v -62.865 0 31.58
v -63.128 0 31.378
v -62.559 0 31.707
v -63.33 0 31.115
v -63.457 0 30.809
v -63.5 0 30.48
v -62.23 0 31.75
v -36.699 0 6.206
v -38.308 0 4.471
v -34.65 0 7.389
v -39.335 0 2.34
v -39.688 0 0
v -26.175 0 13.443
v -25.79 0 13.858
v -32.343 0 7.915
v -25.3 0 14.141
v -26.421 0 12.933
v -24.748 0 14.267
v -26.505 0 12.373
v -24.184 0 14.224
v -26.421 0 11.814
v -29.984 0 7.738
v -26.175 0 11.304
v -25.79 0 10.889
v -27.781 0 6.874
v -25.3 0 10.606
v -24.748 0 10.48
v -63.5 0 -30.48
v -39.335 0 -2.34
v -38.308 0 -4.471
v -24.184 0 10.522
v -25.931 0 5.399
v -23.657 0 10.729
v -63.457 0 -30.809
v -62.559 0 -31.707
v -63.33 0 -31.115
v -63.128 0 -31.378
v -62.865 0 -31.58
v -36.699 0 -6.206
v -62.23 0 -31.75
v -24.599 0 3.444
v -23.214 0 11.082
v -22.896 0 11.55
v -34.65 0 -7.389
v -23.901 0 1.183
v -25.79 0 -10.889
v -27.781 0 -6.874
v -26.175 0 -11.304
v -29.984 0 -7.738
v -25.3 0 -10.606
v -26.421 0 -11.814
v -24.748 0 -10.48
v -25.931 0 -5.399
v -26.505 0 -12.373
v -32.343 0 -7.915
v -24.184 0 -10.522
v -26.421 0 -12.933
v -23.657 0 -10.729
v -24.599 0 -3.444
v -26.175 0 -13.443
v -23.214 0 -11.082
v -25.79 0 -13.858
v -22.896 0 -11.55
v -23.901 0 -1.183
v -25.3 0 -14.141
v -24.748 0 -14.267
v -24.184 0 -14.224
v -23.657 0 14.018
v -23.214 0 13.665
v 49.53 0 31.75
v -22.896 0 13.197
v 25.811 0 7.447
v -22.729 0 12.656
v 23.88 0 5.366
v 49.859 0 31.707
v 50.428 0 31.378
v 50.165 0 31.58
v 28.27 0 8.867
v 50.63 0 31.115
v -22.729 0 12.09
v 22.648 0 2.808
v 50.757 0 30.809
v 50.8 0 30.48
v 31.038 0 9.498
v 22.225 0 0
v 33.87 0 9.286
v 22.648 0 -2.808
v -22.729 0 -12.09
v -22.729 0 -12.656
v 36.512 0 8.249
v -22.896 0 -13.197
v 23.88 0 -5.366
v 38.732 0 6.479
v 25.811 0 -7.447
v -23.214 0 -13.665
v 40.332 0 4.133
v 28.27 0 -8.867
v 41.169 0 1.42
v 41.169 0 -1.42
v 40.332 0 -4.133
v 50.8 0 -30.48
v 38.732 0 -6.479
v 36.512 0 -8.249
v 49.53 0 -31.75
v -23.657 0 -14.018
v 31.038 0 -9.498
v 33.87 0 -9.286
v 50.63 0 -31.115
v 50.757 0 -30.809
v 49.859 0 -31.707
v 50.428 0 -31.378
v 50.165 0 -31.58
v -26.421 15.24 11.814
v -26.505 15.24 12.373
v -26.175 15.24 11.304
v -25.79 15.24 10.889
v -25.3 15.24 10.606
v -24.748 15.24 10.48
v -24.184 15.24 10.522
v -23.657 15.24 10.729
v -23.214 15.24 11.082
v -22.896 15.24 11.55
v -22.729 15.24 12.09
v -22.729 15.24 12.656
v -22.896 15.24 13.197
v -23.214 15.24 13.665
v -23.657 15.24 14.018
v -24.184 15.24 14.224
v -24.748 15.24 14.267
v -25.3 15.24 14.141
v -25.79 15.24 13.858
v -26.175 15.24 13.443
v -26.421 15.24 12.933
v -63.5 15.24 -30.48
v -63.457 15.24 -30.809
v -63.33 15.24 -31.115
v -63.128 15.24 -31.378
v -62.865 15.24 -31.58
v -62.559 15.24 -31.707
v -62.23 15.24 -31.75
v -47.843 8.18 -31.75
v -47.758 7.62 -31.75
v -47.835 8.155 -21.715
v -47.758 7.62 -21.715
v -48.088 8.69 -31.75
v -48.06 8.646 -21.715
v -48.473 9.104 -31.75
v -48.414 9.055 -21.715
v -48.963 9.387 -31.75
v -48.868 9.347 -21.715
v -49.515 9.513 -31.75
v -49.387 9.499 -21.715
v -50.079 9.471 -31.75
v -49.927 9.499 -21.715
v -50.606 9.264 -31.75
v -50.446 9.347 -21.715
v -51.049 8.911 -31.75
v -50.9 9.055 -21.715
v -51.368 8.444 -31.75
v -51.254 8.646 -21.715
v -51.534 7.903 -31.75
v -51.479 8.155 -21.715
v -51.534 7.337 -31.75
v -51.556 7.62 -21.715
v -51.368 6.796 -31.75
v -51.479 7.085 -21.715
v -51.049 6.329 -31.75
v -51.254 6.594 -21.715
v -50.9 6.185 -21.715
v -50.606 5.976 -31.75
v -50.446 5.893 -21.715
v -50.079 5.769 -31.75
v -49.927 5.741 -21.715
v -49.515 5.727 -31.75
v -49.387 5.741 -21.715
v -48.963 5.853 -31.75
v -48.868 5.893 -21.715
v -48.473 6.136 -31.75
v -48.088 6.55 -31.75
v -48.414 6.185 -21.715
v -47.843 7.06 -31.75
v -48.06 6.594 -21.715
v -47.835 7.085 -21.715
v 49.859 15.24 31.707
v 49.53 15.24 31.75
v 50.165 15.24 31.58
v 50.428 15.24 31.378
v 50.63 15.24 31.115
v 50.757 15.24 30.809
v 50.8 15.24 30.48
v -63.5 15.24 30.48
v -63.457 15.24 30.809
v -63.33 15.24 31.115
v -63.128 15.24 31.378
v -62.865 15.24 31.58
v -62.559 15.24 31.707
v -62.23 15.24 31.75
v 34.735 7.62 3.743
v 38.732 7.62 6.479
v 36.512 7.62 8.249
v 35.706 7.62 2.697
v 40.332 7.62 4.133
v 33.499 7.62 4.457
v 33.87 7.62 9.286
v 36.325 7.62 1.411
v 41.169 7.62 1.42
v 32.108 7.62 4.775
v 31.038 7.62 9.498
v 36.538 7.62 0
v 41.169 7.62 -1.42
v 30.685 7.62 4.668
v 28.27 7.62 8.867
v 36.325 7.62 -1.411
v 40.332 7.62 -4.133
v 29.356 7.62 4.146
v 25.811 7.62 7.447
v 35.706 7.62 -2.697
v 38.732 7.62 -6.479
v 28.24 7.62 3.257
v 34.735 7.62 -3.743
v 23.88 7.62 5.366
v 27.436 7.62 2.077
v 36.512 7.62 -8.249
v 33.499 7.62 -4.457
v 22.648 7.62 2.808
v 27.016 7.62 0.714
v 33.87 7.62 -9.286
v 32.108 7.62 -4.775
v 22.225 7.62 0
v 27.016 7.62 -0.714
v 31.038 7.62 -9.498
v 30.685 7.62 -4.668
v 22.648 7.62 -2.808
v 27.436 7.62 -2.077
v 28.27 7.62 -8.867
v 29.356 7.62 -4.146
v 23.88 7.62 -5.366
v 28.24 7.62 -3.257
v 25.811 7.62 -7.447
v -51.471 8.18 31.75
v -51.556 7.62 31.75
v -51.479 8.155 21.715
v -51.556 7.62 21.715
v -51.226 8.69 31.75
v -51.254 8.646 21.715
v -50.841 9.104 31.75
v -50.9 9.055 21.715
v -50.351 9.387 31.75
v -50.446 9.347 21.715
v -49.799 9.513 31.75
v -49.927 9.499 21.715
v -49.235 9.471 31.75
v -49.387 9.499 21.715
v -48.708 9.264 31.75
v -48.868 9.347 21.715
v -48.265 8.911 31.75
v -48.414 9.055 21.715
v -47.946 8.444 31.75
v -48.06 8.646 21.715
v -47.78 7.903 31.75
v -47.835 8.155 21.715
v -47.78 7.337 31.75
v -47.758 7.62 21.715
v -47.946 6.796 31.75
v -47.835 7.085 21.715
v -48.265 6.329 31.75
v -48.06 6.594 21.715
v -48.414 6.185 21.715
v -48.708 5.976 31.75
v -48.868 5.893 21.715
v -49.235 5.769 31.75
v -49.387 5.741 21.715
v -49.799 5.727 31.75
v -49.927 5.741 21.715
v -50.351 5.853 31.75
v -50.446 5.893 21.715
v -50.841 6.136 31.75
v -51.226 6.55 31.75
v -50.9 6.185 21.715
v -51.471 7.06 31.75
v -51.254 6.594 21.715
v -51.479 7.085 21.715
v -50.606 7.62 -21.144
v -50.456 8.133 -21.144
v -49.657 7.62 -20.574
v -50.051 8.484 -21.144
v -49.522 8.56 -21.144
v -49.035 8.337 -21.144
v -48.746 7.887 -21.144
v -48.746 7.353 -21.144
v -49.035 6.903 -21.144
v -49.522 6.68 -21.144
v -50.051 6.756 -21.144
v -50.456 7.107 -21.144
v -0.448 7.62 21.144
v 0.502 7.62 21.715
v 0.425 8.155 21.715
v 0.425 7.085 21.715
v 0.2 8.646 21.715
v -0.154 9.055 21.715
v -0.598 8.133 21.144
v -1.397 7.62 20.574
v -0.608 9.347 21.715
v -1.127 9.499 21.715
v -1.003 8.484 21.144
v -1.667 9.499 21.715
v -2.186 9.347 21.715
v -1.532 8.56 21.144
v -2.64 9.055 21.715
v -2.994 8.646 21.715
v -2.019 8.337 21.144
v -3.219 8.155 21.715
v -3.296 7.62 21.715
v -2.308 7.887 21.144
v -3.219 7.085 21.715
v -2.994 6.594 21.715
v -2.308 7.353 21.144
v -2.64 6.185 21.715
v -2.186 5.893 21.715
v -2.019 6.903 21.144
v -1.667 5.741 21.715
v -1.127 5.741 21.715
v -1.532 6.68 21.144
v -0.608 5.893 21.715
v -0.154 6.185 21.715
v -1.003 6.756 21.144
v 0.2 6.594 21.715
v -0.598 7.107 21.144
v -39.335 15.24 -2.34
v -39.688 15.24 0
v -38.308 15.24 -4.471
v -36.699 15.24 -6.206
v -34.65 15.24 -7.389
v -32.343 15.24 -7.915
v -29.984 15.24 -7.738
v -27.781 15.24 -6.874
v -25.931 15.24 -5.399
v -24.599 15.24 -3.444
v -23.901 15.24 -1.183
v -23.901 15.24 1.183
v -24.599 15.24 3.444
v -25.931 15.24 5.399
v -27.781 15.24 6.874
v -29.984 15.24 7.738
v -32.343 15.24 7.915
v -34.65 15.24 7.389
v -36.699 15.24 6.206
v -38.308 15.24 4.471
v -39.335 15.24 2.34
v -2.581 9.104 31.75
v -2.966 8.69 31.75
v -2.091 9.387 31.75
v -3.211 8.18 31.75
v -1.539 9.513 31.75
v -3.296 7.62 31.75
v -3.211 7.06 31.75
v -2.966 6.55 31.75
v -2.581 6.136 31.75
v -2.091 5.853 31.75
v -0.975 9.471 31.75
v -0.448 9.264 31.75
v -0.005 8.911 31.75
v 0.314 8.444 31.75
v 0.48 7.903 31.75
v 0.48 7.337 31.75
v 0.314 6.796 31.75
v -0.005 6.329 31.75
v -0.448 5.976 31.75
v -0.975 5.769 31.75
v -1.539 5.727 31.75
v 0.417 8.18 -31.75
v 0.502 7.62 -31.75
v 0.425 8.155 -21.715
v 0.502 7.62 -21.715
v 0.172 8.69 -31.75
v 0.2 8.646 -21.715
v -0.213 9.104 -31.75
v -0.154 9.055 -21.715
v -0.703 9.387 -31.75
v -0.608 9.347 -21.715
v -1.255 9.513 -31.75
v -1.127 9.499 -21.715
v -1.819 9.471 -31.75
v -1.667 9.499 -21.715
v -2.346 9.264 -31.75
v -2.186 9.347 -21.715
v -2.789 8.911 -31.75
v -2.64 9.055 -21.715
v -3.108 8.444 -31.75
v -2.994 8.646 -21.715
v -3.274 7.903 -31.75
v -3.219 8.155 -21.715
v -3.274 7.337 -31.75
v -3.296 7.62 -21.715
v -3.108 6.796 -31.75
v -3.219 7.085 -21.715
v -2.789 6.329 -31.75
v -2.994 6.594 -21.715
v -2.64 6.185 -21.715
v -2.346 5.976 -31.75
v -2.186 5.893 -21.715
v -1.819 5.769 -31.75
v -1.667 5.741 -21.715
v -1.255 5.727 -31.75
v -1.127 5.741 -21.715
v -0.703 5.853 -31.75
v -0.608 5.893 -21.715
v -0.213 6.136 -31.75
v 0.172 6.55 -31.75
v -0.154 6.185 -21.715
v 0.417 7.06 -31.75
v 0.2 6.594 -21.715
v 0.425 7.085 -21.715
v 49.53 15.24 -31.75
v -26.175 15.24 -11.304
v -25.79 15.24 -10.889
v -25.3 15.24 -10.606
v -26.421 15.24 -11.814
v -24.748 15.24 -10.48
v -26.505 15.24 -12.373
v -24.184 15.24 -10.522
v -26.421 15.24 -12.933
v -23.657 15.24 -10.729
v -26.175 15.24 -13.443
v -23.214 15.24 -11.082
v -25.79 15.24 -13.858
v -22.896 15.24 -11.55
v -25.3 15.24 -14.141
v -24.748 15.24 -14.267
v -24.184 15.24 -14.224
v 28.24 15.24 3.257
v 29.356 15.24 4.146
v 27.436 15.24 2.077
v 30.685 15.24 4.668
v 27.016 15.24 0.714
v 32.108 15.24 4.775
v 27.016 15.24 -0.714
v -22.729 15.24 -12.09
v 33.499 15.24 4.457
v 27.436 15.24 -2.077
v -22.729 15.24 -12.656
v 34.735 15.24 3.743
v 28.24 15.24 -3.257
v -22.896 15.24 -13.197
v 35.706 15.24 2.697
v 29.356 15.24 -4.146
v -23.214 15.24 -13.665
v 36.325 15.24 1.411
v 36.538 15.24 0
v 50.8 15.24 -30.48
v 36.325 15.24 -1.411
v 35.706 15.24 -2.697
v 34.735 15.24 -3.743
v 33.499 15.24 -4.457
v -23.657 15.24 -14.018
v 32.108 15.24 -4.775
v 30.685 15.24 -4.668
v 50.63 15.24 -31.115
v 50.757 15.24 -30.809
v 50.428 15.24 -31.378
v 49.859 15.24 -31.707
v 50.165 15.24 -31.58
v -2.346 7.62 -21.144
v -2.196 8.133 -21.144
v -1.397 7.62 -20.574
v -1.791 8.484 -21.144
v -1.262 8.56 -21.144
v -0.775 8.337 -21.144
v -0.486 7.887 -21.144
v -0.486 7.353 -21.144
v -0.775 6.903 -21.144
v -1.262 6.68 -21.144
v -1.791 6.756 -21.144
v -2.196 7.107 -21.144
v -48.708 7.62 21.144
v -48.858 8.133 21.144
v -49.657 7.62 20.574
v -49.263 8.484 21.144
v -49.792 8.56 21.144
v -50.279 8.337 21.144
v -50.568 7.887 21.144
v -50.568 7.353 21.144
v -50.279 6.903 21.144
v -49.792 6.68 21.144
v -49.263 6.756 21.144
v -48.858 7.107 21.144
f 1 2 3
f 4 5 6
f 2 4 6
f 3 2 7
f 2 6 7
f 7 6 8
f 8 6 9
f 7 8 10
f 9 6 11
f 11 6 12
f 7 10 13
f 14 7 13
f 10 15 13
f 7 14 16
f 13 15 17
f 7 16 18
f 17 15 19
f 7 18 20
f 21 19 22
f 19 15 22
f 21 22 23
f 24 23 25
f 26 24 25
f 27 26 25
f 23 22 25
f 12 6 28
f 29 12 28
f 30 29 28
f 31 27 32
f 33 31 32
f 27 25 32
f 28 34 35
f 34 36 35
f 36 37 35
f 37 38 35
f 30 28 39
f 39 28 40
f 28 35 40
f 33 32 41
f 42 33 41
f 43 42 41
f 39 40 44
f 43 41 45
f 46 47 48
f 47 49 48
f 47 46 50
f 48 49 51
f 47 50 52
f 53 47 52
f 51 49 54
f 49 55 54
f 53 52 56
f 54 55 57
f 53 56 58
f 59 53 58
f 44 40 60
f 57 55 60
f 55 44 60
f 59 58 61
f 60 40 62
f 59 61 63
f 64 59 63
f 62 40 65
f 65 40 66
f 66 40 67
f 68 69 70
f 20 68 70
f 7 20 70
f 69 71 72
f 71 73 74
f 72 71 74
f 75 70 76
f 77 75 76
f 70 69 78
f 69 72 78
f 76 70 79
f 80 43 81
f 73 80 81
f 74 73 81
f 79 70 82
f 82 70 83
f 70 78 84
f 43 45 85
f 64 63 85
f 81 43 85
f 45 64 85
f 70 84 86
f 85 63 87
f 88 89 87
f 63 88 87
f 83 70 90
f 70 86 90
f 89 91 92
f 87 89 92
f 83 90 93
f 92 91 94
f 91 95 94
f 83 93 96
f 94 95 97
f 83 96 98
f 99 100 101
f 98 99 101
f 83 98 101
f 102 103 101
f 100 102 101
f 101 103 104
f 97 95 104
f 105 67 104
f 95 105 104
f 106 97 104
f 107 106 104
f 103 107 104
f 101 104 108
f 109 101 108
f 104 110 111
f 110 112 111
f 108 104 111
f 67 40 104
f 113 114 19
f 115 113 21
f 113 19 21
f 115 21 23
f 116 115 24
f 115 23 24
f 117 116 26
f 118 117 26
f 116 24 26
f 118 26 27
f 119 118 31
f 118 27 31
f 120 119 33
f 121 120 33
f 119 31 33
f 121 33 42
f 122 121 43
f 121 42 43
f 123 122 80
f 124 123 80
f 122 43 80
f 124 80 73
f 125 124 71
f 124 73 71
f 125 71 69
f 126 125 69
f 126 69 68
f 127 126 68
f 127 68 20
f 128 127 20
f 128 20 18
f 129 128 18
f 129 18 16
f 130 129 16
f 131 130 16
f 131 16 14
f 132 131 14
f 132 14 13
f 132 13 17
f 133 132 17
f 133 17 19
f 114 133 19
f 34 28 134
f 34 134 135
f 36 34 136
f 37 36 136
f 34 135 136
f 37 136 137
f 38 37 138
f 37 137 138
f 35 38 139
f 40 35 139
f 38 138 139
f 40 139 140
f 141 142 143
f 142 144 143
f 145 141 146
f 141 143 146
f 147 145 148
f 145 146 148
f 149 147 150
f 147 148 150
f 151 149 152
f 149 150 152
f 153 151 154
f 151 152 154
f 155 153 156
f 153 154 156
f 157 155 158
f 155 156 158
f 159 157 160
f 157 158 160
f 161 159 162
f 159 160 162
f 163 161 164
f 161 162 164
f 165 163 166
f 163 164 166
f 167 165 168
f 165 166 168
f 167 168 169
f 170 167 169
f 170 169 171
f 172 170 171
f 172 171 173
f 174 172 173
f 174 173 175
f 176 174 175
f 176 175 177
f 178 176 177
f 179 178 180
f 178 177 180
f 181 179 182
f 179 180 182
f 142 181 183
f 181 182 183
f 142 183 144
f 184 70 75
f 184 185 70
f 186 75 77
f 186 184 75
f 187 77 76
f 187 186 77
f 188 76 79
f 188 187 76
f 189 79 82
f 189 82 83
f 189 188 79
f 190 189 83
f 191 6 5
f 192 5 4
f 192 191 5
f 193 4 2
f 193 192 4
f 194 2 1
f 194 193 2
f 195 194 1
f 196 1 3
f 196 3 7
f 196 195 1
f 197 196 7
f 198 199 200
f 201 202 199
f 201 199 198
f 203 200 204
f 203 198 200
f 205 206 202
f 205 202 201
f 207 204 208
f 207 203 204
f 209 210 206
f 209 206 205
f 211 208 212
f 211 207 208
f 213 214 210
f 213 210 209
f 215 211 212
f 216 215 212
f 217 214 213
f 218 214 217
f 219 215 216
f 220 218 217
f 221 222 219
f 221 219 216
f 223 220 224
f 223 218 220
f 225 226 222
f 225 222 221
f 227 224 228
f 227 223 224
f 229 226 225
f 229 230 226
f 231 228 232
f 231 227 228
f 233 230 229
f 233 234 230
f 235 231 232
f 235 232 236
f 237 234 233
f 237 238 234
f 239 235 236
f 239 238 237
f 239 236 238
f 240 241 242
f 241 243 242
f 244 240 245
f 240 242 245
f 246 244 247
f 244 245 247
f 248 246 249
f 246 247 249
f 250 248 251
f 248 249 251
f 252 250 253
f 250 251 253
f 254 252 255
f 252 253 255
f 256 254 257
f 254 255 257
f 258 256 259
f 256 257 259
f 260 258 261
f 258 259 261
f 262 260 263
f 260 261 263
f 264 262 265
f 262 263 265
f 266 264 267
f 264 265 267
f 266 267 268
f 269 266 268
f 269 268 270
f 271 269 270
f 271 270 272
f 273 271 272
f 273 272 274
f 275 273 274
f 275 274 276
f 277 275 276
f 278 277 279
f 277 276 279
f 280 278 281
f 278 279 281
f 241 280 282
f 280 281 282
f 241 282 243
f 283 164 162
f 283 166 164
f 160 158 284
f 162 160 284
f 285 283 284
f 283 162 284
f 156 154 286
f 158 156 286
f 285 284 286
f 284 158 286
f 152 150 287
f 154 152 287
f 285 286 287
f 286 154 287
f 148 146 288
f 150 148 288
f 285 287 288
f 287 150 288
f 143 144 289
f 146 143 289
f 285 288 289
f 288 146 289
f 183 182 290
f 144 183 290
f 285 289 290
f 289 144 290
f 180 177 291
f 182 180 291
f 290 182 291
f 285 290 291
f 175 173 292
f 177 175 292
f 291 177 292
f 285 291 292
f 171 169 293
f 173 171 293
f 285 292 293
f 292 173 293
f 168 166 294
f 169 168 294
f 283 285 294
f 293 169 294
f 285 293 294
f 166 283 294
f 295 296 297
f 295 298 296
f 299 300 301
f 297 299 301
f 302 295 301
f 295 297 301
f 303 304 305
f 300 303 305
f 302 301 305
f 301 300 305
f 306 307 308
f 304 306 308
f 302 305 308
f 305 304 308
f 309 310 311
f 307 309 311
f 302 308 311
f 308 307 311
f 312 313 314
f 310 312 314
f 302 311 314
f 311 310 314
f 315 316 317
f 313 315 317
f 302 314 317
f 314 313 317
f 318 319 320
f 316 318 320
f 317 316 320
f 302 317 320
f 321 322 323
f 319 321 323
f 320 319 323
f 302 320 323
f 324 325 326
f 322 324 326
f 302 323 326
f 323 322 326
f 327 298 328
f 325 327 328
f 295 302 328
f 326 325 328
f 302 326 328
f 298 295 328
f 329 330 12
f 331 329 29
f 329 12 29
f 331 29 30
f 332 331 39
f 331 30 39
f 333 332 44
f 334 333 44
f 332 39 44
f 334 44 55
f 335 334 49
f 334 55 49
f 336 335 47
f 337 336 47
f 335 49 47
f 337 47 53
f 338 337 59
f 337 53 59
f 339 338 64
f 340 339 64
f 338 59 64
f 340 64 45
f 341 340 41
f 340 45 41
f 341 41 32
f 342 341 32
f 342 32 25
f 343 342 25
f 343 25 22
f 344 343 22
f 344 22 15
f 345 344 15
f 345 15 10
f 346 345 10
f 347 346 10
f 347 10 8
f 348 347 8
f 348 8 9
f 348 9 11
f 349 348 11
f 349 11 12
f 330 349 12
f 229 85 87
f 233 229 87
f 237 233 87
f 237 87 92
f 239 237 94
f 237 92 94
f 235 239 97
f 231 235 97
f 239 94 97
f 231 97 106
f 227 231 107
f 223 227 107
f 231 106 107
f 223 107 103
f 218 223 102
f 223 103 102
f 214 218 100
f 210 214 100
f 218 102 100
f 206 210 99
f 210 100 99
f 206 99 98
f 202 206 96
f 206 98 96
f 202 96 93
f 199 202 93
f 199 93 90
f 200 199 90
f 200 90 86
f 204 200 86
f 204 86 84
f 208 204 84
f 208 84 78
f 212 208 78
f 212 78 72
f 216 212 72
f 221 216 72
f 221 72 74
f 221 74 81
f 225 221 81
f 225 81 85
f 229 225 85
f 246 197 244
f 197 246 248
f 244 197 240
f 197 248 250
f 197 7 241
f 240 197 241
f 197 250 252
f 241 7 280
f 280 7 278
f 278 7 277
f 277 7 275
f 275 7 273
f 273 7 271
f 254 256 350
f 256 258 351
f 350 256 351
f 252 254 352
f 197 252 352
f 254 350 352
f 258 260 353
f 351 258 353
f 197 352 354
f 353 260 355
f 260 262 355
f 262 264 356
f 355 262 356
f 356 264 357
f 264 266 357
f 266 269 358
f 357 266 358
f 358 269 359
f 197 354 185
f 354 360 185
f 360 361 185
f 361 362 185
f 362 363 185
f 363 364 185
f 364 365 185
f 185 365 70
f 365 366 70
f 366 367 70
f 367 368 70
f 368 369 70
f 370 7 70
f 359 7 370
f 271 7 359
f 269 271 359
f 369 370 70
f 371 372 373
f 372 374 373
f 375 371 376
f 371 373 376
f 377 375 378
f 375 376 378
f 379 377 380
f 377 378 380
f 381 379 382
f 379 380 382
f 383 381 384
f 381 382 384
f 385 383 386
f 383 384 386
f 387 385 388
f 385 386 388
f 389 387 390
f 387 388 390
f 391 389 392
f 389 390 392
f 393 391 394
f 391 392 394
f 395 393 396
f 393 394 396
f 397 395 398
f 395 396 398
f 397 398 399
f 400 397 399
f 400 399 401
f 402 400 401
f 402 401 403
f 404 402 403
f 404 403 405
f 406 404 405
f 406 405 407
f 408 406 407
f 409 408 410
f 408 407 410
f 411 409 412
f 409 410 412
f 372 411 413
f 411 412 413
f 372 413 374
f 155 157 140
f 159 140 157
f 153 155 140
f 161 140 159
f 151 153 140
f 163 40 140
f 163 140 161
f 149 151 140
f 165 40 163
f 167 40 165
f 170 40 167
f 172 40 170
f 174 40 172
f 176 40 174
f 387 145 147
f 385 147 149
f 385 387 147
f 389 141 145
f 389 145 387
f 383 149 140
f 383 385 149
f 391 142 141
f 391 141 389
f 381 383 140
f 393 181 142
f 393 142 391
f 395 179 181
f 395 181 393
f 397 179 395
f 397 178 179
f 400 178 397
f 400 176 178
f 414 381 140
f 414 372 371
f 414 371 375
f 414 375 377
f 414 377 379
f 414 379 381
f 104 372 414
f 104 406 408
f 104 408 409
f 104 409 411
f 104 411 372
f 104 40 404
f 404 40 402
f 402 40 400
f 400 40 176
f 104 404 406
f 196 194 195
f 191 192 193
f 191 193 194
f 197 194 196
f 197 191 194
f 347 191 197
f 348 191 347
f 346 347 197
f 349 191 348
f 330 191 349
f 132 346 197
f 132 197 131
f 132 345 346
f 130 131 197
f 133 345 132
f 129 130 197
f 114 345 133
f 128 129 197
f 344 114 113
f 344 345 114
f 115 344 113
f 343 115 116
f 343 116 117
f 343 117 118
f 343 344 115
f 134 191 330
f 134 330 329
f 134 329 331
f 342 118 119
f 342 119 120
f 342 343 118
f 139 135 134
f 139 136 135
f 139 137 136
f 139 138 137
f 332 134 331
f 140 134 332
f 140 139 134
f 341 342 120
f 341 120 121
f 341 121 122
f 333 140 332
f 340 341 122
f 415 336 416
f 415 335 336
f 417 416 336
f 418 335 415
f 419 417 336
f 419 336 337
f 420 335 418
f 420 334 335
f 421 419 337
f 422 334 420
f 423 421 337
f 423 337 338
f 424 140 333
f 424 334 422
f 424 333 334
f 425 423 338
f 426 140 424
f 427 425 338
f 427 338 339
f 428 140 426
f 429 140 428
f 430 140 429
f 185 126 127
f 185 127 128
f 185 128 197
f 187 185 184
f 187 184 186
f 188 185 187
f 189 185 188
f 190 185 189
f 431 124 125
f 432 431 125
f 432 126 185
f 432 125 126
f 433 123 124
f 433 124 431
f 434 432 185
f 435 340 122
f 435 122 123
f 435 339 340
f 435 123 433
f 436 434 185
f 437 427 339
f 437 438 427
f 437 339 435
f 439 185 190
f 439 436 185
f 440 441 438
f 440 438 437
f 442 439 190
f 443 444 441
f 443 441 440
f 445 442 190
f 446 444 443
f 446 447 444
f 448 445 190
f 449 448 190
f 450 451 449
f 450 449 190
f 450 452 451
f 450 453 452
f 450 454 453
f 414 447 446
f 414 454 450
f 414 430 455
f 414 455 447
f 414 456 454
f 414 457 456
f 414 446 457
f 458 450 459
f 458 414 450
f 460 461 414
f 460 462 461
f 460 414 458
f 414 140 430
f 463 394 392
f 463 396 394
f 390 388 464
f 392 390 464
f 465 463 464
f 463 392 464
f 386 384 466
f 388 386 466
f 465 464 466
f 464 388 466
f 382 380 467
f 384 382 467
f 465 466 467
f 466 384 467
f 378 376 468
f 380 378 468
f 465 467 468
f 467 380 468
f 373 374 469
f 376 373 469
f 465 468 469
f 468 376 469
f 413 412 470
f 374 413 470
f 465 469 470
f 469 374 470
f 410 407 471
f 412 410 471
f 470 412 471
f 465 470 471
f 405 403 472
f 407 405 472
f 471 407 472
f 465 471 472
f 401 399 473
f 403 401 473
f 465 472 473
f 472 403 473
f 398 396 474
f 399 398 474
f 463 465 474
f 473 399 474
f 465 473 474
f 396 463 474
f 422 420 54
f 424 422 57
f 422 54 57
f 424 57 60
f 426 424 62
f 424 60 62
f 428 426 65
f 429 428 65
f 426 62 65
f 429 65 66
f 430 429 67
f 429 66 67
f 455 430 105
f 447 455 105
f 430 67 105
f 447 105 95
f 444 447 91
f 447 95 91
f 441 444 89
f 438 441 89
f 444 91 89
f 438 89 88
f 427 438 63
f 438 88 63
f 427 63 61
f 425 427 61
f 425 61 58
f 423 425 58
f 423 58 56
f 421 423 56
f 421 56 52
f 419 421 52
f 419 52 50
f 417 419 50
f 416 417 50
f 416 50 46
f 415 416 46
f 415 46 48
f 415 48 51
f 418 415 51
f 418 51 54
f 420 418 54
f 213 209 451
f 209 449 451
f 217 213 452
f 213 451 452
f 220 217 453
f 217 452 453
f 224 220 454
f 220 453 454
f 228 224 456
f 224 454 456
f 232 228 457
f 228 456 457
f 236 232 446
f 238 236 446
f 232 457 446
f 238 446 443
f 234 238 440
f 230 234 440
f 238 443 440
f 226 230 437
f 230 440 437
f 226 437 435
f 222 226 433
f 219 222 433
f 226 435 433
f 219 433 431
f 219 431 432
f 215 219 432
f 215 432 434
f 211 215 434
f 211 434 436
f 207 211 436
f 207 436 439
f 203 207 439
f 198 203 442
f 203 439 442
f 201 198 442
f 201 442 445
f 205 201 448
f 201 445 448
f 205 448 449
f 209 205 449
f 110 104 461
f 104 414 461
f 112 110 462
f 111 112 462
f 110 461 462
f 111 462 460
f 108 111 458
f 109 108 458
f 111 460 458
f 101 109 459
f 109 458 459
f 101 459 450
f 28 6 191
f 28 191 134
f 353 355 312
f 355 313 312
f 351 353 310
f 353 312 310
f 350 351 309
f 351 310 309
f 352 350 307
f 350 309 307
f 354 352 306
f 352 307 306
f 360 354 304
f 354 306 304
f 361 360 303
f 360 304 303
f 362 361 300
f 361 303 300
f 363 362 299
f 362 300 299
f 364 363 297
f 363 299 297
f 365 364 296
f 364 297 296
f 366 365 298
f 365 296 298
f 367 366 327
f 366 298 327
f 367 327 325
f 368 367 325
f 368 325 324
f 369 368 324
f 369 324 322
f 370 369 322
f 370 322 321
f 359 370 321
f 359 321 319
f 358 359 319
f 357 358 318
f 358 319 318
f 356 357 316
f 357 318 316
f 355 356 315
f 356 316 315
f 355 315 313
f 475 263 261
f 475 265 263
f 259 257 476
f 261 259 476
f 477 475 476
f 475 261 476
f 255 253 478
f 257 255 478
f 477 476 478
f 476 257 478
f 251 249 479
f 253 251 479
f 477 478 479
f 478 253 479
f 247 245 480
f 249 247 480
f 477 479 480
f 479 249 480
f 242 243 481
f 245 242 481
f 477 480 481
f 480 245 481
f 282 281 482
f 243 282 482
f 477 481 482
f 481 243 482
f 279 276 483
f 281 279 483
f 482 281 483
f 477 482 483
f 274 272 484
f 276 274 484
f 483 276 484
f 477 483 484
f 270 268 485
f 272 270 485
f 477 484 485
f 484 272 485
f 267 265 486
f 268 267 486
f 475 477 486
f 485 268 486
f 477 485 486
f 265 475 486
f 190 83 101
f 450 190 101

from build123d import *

# Parameters (mm, degrees)
SKETCH1_W                                            = 114.3
SKETCH1_H                                            = 63.5
BOSS_EXTRUDE1_DEPTH                                  = 15.24
F_5_8_0_625_DIAMETER_HOLE1_D                         = 15.875
F_10_24_TAPPED_HOLE3_D                               = 3.7973
CBORE_FOR_3_8_BINDING_HEAD_MACHINE_SCREW_D           = 9.5758
CBORE_FOR_3_8_BINDING_HEAD_MACHINE_SCREW_CBORE_D     = 19.05
CBORE_FOR_3_8_BINDING_HEAD_MACHINE_SCREW_CBORE_DEPTH = 7.62
F_10_24_TAPPED_HOLE1_D                               = 3.7973
F_10_24_TAPPED_HOLE1_DEPTH                           = 10.035175986
F_10_24_TAPPED_HOLE1_TIP                             = 1.140824014
F_10_24_TAPPED_HOLE2_D                               = 3.7973
F_10_24_TAPPED_HOLE2_DEPTH                           = 10.035175986
F_10_24_TAPPED_HOLE2_TIP                             = 1.140824014
FILLET1_R                                            = 1.27


with BuildPart() as part:
    # Sketch1 → Boss-Extrude1 (new body)
    with BuildSketch(Plane(origin=(0, 0, 0), x_dir=(1, 0, 0), z_dir=(0, 1, 0))):
        with Locations((-6.35, 0)):
            Rectangle(SKETCH1_W, SKETCH1_H)
    extrude(amount=BOSS_EXTRUDE1_DEPTH)

    # 5/8 (0.625) Diameter Hole1 (through all)
    with Locations(Plane(origin=(0, 15.24, 0), x_dir=(1, 0, 0), z_dir=(0, 1, 0))):
        with Locations((-31.75, 0)):
            Hole(F_5_8_0_625_DIAMETER_HOLE1_D / 2)

    # #10-24 Tapped Hole3 (through all)
    with Locations(Plane(origin=(0, 15.24, 0), x_dir=(1, 0, 0), z_dir=(0, 1, 0))):
        with Locations((-24.60625, -12.373337957), (-24.60625, 12.373337957)):
            Hole(F_10_24_TAPPED_HOLE3_D / 2)

    # CBORE for 3/8 Binding Head Machine Screw1 (through all)
    with Locations(Plane(origin=(0, 0, 0), x_dir=(-1, 0, 0), z_dir=(0, -1, 0))):
        with Locations((-31.75, 0)):
            CounterBoreHole(CBORE_FOR_3_8_BINDING_HEAD_MACHINE_SCREW_D / 2, CBORE_FOR_3_8_BINDING_HEAD_MACHINE_SCREW_CBORE_D / 2, CBORE_FOR_3_8_BINDING_HEAD_MACHINE_SCREW_CBORE_DEPTH)

    # #10-24 Tapped Hole1
    with Locations(Plane(origin=(0, 0, -31.75), x_dir=(-1, 0, 0), z_dir=(0, 0, -1))):
        with Locations((49.657, 7.62), (1.397, 7.62)):
            Hole(F_10_24_TAPPED_HOLE1_D / 2, depth=F_10_24_TAPPED_HOLE1_DEPTH)
            with Locations((0, 0, -(F_10_24_TAPPED_HOLE1_DEPTH + F_10_24_TAPPED_HOLE1_TIP / 2))):  # 118° drill point
                Cone(0, F_10_24_TAPPED_HOLE1_D / 2, F_10_24_TAPPED_HOLE1_TIP, mode=Mode.SUBTRACT)

    # #10-24 Tapped Hole2
    with Locations(Plane.XY.offset(31.75)):
        with Locations((-49.657, 7.62), (-1.397, 7.62)):
            Hole(F_10_24_TAPPED_HOLE2_D / 2, depth=F_10_24_TAPPED_HOLE2_DEPTH)
            with Locations((0, 0, -(F_10_24_TAPPED_HOLE2_DEPTH + F_10_24_TAPPED_HOLE2_TIP / 2))):  # 118° drill point
                Cone(0, F_10_24_TAPPED_HOLE2_D / 2, F_10_24_TAPPED_HOLE2_TIP, mode=Mode.SUBTRACT)

    # Fillet1
    fillet1_edges = [part.edges().sort_by_distance(p)[0] for p in [
        (50.8, 7.62, -31.75),
        (-63.5, 7.62, -31.75),
        (-63.5, 7.62, 31.75),
        (50.8, 7.62, 31.75),
    ]]
    fillet(fillet1_edges, radius=FILLET1_R)


solid = part.part
